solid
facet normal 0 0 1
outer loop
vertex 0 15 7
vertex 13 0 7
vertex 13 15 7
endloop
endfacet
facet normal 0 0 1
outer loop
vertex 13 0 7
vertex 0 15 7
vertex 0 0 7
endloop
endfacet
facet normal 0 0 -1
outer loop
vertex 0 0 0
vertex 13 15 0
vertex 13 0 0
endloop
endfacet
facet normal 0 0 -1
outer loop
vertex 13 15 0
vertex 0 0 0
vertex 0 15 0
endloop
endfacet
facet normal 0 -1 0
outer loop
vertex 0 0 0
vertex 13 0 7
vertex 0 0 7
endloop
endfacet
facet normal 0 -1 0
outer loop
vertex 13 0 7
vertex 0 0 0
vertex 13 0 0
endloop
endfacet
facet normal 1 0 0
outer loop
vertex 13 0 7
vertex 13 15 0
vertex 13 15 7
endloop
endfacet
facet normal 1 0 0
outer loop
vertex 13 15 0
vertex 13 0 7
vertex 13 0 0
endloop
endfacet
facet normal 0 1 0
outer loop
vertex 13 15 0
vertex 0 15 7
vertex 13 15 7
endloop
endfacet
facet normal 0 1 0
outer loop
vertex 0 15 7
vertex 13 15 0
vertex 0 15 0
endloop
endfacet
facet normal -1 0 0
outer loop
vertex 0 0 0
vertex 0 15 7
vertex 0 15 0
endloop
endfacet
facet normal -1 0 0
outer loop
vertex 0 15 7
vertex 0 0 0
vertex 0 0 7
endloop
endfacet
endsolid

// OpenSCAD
// Generated by SolidPython 1.0.1 on 2020-07-29 00:46:55


cube(size = [13, 15, 7]);
/***********************************************
*********      SolidPython code:      **********
************************************************
 
# import packages: SolidPython
from solid import *
from solid.utils import *
from itertools import chain, combinations, permutations


class Resize:

    def __init__(self, scad_file):
        self.scad_file = scad_file
        #self.scad_file = import_scad(scad_file)
        # cone/cylinder param:
        self.r1 = 0
        self.r2 = 0
        self.h = 0
        # rectangular prism param:
        self.w = 0
        self.l = 0
        # ellipse param:
        self.r = 0

    # import OpenScad code (file name corresponds to shape)


    # classify shape + parameters
    def assign(self, param1, param2, param3):
        if self.scad_file == 'cone.scad':
            self.r1 = param1
            self.r2 = param2
            self.h = param3
        elif self.scad_file == 'cylinder.scad':
            self.r1 = param1
            self.r2 = param2
            self.h = param3
        elif self.scad_file == 'rectangularPrism.scad':
            self.h = param1
            self.l = param2
            self.w = param3
        else:
            self.r = param1
            self.h = param2

    # resize parameters
    def iterate(self):
        x = range(3, 20, 2)
        i = 1
        if self.scad_file == 'cone.scad':
            tempList = list(permutations(x, 2))
            for temp in tempList:
                param1 = temp[0]
                param2 = temp[1]
                filepath = 'produced_scad_files/' + 'cone' + str(param1) + '_' + str(param2) + '_' + '.scad'
                scad_render_to_file(cylinder(h=param1, r1=param2, r2=0), filepath)

        elif self.scad_file == 'cylinder.scad':
            tempList = list(permutations(x, 3))
            for temp in tempList:
                param1 = temp[0]
                param2 = temp[1]
                filepath = 'produced_scad_files/' + 'cylinder' + str(param1) + '_' + str(param2) + '_' + '.scad'
                scad_render_to_file(cylinder(h=param1, r1=param2, r2=param2), filepath)

        elif self.scad_file == 'rectangularPrism.scad':
            tempList = list(permutations(x, 3))
            for temp in tempList:
                param1 = temp[0]
                param2 = temp[1]
                param3 = temp[2]
                filepath = 'produced_scad_files/' + 'rectangularPrism' + str(param1) + '_' + str(param2) + '_' + str(
                    param3) + '.scad'
                scad_render_to_file(cube(size=(param1, param2, param3)), filepath)

        elif self.scad_file == 'ellipse.scad':
            tempList = list(permutations(x, 4))
            for temp in tempList:
                param1 = temp[0]
                param2 = temp[1]
                param3 = temp[2]
                param4 = temp[3]
                filepath = 'produced_scad_files/' + 'ellipse' + str(param1) + '_' + str(param2) + '_' + str(param3) + '_' + str(param4) + '.scad'
                scad_render_to_file(scale([param1, param2, param3])(sphere(r=param4)), filepath)

    def render_to_scadfile(self):
        scad_render_to_file(scad, 'example.scad') 
 
************************************************/
